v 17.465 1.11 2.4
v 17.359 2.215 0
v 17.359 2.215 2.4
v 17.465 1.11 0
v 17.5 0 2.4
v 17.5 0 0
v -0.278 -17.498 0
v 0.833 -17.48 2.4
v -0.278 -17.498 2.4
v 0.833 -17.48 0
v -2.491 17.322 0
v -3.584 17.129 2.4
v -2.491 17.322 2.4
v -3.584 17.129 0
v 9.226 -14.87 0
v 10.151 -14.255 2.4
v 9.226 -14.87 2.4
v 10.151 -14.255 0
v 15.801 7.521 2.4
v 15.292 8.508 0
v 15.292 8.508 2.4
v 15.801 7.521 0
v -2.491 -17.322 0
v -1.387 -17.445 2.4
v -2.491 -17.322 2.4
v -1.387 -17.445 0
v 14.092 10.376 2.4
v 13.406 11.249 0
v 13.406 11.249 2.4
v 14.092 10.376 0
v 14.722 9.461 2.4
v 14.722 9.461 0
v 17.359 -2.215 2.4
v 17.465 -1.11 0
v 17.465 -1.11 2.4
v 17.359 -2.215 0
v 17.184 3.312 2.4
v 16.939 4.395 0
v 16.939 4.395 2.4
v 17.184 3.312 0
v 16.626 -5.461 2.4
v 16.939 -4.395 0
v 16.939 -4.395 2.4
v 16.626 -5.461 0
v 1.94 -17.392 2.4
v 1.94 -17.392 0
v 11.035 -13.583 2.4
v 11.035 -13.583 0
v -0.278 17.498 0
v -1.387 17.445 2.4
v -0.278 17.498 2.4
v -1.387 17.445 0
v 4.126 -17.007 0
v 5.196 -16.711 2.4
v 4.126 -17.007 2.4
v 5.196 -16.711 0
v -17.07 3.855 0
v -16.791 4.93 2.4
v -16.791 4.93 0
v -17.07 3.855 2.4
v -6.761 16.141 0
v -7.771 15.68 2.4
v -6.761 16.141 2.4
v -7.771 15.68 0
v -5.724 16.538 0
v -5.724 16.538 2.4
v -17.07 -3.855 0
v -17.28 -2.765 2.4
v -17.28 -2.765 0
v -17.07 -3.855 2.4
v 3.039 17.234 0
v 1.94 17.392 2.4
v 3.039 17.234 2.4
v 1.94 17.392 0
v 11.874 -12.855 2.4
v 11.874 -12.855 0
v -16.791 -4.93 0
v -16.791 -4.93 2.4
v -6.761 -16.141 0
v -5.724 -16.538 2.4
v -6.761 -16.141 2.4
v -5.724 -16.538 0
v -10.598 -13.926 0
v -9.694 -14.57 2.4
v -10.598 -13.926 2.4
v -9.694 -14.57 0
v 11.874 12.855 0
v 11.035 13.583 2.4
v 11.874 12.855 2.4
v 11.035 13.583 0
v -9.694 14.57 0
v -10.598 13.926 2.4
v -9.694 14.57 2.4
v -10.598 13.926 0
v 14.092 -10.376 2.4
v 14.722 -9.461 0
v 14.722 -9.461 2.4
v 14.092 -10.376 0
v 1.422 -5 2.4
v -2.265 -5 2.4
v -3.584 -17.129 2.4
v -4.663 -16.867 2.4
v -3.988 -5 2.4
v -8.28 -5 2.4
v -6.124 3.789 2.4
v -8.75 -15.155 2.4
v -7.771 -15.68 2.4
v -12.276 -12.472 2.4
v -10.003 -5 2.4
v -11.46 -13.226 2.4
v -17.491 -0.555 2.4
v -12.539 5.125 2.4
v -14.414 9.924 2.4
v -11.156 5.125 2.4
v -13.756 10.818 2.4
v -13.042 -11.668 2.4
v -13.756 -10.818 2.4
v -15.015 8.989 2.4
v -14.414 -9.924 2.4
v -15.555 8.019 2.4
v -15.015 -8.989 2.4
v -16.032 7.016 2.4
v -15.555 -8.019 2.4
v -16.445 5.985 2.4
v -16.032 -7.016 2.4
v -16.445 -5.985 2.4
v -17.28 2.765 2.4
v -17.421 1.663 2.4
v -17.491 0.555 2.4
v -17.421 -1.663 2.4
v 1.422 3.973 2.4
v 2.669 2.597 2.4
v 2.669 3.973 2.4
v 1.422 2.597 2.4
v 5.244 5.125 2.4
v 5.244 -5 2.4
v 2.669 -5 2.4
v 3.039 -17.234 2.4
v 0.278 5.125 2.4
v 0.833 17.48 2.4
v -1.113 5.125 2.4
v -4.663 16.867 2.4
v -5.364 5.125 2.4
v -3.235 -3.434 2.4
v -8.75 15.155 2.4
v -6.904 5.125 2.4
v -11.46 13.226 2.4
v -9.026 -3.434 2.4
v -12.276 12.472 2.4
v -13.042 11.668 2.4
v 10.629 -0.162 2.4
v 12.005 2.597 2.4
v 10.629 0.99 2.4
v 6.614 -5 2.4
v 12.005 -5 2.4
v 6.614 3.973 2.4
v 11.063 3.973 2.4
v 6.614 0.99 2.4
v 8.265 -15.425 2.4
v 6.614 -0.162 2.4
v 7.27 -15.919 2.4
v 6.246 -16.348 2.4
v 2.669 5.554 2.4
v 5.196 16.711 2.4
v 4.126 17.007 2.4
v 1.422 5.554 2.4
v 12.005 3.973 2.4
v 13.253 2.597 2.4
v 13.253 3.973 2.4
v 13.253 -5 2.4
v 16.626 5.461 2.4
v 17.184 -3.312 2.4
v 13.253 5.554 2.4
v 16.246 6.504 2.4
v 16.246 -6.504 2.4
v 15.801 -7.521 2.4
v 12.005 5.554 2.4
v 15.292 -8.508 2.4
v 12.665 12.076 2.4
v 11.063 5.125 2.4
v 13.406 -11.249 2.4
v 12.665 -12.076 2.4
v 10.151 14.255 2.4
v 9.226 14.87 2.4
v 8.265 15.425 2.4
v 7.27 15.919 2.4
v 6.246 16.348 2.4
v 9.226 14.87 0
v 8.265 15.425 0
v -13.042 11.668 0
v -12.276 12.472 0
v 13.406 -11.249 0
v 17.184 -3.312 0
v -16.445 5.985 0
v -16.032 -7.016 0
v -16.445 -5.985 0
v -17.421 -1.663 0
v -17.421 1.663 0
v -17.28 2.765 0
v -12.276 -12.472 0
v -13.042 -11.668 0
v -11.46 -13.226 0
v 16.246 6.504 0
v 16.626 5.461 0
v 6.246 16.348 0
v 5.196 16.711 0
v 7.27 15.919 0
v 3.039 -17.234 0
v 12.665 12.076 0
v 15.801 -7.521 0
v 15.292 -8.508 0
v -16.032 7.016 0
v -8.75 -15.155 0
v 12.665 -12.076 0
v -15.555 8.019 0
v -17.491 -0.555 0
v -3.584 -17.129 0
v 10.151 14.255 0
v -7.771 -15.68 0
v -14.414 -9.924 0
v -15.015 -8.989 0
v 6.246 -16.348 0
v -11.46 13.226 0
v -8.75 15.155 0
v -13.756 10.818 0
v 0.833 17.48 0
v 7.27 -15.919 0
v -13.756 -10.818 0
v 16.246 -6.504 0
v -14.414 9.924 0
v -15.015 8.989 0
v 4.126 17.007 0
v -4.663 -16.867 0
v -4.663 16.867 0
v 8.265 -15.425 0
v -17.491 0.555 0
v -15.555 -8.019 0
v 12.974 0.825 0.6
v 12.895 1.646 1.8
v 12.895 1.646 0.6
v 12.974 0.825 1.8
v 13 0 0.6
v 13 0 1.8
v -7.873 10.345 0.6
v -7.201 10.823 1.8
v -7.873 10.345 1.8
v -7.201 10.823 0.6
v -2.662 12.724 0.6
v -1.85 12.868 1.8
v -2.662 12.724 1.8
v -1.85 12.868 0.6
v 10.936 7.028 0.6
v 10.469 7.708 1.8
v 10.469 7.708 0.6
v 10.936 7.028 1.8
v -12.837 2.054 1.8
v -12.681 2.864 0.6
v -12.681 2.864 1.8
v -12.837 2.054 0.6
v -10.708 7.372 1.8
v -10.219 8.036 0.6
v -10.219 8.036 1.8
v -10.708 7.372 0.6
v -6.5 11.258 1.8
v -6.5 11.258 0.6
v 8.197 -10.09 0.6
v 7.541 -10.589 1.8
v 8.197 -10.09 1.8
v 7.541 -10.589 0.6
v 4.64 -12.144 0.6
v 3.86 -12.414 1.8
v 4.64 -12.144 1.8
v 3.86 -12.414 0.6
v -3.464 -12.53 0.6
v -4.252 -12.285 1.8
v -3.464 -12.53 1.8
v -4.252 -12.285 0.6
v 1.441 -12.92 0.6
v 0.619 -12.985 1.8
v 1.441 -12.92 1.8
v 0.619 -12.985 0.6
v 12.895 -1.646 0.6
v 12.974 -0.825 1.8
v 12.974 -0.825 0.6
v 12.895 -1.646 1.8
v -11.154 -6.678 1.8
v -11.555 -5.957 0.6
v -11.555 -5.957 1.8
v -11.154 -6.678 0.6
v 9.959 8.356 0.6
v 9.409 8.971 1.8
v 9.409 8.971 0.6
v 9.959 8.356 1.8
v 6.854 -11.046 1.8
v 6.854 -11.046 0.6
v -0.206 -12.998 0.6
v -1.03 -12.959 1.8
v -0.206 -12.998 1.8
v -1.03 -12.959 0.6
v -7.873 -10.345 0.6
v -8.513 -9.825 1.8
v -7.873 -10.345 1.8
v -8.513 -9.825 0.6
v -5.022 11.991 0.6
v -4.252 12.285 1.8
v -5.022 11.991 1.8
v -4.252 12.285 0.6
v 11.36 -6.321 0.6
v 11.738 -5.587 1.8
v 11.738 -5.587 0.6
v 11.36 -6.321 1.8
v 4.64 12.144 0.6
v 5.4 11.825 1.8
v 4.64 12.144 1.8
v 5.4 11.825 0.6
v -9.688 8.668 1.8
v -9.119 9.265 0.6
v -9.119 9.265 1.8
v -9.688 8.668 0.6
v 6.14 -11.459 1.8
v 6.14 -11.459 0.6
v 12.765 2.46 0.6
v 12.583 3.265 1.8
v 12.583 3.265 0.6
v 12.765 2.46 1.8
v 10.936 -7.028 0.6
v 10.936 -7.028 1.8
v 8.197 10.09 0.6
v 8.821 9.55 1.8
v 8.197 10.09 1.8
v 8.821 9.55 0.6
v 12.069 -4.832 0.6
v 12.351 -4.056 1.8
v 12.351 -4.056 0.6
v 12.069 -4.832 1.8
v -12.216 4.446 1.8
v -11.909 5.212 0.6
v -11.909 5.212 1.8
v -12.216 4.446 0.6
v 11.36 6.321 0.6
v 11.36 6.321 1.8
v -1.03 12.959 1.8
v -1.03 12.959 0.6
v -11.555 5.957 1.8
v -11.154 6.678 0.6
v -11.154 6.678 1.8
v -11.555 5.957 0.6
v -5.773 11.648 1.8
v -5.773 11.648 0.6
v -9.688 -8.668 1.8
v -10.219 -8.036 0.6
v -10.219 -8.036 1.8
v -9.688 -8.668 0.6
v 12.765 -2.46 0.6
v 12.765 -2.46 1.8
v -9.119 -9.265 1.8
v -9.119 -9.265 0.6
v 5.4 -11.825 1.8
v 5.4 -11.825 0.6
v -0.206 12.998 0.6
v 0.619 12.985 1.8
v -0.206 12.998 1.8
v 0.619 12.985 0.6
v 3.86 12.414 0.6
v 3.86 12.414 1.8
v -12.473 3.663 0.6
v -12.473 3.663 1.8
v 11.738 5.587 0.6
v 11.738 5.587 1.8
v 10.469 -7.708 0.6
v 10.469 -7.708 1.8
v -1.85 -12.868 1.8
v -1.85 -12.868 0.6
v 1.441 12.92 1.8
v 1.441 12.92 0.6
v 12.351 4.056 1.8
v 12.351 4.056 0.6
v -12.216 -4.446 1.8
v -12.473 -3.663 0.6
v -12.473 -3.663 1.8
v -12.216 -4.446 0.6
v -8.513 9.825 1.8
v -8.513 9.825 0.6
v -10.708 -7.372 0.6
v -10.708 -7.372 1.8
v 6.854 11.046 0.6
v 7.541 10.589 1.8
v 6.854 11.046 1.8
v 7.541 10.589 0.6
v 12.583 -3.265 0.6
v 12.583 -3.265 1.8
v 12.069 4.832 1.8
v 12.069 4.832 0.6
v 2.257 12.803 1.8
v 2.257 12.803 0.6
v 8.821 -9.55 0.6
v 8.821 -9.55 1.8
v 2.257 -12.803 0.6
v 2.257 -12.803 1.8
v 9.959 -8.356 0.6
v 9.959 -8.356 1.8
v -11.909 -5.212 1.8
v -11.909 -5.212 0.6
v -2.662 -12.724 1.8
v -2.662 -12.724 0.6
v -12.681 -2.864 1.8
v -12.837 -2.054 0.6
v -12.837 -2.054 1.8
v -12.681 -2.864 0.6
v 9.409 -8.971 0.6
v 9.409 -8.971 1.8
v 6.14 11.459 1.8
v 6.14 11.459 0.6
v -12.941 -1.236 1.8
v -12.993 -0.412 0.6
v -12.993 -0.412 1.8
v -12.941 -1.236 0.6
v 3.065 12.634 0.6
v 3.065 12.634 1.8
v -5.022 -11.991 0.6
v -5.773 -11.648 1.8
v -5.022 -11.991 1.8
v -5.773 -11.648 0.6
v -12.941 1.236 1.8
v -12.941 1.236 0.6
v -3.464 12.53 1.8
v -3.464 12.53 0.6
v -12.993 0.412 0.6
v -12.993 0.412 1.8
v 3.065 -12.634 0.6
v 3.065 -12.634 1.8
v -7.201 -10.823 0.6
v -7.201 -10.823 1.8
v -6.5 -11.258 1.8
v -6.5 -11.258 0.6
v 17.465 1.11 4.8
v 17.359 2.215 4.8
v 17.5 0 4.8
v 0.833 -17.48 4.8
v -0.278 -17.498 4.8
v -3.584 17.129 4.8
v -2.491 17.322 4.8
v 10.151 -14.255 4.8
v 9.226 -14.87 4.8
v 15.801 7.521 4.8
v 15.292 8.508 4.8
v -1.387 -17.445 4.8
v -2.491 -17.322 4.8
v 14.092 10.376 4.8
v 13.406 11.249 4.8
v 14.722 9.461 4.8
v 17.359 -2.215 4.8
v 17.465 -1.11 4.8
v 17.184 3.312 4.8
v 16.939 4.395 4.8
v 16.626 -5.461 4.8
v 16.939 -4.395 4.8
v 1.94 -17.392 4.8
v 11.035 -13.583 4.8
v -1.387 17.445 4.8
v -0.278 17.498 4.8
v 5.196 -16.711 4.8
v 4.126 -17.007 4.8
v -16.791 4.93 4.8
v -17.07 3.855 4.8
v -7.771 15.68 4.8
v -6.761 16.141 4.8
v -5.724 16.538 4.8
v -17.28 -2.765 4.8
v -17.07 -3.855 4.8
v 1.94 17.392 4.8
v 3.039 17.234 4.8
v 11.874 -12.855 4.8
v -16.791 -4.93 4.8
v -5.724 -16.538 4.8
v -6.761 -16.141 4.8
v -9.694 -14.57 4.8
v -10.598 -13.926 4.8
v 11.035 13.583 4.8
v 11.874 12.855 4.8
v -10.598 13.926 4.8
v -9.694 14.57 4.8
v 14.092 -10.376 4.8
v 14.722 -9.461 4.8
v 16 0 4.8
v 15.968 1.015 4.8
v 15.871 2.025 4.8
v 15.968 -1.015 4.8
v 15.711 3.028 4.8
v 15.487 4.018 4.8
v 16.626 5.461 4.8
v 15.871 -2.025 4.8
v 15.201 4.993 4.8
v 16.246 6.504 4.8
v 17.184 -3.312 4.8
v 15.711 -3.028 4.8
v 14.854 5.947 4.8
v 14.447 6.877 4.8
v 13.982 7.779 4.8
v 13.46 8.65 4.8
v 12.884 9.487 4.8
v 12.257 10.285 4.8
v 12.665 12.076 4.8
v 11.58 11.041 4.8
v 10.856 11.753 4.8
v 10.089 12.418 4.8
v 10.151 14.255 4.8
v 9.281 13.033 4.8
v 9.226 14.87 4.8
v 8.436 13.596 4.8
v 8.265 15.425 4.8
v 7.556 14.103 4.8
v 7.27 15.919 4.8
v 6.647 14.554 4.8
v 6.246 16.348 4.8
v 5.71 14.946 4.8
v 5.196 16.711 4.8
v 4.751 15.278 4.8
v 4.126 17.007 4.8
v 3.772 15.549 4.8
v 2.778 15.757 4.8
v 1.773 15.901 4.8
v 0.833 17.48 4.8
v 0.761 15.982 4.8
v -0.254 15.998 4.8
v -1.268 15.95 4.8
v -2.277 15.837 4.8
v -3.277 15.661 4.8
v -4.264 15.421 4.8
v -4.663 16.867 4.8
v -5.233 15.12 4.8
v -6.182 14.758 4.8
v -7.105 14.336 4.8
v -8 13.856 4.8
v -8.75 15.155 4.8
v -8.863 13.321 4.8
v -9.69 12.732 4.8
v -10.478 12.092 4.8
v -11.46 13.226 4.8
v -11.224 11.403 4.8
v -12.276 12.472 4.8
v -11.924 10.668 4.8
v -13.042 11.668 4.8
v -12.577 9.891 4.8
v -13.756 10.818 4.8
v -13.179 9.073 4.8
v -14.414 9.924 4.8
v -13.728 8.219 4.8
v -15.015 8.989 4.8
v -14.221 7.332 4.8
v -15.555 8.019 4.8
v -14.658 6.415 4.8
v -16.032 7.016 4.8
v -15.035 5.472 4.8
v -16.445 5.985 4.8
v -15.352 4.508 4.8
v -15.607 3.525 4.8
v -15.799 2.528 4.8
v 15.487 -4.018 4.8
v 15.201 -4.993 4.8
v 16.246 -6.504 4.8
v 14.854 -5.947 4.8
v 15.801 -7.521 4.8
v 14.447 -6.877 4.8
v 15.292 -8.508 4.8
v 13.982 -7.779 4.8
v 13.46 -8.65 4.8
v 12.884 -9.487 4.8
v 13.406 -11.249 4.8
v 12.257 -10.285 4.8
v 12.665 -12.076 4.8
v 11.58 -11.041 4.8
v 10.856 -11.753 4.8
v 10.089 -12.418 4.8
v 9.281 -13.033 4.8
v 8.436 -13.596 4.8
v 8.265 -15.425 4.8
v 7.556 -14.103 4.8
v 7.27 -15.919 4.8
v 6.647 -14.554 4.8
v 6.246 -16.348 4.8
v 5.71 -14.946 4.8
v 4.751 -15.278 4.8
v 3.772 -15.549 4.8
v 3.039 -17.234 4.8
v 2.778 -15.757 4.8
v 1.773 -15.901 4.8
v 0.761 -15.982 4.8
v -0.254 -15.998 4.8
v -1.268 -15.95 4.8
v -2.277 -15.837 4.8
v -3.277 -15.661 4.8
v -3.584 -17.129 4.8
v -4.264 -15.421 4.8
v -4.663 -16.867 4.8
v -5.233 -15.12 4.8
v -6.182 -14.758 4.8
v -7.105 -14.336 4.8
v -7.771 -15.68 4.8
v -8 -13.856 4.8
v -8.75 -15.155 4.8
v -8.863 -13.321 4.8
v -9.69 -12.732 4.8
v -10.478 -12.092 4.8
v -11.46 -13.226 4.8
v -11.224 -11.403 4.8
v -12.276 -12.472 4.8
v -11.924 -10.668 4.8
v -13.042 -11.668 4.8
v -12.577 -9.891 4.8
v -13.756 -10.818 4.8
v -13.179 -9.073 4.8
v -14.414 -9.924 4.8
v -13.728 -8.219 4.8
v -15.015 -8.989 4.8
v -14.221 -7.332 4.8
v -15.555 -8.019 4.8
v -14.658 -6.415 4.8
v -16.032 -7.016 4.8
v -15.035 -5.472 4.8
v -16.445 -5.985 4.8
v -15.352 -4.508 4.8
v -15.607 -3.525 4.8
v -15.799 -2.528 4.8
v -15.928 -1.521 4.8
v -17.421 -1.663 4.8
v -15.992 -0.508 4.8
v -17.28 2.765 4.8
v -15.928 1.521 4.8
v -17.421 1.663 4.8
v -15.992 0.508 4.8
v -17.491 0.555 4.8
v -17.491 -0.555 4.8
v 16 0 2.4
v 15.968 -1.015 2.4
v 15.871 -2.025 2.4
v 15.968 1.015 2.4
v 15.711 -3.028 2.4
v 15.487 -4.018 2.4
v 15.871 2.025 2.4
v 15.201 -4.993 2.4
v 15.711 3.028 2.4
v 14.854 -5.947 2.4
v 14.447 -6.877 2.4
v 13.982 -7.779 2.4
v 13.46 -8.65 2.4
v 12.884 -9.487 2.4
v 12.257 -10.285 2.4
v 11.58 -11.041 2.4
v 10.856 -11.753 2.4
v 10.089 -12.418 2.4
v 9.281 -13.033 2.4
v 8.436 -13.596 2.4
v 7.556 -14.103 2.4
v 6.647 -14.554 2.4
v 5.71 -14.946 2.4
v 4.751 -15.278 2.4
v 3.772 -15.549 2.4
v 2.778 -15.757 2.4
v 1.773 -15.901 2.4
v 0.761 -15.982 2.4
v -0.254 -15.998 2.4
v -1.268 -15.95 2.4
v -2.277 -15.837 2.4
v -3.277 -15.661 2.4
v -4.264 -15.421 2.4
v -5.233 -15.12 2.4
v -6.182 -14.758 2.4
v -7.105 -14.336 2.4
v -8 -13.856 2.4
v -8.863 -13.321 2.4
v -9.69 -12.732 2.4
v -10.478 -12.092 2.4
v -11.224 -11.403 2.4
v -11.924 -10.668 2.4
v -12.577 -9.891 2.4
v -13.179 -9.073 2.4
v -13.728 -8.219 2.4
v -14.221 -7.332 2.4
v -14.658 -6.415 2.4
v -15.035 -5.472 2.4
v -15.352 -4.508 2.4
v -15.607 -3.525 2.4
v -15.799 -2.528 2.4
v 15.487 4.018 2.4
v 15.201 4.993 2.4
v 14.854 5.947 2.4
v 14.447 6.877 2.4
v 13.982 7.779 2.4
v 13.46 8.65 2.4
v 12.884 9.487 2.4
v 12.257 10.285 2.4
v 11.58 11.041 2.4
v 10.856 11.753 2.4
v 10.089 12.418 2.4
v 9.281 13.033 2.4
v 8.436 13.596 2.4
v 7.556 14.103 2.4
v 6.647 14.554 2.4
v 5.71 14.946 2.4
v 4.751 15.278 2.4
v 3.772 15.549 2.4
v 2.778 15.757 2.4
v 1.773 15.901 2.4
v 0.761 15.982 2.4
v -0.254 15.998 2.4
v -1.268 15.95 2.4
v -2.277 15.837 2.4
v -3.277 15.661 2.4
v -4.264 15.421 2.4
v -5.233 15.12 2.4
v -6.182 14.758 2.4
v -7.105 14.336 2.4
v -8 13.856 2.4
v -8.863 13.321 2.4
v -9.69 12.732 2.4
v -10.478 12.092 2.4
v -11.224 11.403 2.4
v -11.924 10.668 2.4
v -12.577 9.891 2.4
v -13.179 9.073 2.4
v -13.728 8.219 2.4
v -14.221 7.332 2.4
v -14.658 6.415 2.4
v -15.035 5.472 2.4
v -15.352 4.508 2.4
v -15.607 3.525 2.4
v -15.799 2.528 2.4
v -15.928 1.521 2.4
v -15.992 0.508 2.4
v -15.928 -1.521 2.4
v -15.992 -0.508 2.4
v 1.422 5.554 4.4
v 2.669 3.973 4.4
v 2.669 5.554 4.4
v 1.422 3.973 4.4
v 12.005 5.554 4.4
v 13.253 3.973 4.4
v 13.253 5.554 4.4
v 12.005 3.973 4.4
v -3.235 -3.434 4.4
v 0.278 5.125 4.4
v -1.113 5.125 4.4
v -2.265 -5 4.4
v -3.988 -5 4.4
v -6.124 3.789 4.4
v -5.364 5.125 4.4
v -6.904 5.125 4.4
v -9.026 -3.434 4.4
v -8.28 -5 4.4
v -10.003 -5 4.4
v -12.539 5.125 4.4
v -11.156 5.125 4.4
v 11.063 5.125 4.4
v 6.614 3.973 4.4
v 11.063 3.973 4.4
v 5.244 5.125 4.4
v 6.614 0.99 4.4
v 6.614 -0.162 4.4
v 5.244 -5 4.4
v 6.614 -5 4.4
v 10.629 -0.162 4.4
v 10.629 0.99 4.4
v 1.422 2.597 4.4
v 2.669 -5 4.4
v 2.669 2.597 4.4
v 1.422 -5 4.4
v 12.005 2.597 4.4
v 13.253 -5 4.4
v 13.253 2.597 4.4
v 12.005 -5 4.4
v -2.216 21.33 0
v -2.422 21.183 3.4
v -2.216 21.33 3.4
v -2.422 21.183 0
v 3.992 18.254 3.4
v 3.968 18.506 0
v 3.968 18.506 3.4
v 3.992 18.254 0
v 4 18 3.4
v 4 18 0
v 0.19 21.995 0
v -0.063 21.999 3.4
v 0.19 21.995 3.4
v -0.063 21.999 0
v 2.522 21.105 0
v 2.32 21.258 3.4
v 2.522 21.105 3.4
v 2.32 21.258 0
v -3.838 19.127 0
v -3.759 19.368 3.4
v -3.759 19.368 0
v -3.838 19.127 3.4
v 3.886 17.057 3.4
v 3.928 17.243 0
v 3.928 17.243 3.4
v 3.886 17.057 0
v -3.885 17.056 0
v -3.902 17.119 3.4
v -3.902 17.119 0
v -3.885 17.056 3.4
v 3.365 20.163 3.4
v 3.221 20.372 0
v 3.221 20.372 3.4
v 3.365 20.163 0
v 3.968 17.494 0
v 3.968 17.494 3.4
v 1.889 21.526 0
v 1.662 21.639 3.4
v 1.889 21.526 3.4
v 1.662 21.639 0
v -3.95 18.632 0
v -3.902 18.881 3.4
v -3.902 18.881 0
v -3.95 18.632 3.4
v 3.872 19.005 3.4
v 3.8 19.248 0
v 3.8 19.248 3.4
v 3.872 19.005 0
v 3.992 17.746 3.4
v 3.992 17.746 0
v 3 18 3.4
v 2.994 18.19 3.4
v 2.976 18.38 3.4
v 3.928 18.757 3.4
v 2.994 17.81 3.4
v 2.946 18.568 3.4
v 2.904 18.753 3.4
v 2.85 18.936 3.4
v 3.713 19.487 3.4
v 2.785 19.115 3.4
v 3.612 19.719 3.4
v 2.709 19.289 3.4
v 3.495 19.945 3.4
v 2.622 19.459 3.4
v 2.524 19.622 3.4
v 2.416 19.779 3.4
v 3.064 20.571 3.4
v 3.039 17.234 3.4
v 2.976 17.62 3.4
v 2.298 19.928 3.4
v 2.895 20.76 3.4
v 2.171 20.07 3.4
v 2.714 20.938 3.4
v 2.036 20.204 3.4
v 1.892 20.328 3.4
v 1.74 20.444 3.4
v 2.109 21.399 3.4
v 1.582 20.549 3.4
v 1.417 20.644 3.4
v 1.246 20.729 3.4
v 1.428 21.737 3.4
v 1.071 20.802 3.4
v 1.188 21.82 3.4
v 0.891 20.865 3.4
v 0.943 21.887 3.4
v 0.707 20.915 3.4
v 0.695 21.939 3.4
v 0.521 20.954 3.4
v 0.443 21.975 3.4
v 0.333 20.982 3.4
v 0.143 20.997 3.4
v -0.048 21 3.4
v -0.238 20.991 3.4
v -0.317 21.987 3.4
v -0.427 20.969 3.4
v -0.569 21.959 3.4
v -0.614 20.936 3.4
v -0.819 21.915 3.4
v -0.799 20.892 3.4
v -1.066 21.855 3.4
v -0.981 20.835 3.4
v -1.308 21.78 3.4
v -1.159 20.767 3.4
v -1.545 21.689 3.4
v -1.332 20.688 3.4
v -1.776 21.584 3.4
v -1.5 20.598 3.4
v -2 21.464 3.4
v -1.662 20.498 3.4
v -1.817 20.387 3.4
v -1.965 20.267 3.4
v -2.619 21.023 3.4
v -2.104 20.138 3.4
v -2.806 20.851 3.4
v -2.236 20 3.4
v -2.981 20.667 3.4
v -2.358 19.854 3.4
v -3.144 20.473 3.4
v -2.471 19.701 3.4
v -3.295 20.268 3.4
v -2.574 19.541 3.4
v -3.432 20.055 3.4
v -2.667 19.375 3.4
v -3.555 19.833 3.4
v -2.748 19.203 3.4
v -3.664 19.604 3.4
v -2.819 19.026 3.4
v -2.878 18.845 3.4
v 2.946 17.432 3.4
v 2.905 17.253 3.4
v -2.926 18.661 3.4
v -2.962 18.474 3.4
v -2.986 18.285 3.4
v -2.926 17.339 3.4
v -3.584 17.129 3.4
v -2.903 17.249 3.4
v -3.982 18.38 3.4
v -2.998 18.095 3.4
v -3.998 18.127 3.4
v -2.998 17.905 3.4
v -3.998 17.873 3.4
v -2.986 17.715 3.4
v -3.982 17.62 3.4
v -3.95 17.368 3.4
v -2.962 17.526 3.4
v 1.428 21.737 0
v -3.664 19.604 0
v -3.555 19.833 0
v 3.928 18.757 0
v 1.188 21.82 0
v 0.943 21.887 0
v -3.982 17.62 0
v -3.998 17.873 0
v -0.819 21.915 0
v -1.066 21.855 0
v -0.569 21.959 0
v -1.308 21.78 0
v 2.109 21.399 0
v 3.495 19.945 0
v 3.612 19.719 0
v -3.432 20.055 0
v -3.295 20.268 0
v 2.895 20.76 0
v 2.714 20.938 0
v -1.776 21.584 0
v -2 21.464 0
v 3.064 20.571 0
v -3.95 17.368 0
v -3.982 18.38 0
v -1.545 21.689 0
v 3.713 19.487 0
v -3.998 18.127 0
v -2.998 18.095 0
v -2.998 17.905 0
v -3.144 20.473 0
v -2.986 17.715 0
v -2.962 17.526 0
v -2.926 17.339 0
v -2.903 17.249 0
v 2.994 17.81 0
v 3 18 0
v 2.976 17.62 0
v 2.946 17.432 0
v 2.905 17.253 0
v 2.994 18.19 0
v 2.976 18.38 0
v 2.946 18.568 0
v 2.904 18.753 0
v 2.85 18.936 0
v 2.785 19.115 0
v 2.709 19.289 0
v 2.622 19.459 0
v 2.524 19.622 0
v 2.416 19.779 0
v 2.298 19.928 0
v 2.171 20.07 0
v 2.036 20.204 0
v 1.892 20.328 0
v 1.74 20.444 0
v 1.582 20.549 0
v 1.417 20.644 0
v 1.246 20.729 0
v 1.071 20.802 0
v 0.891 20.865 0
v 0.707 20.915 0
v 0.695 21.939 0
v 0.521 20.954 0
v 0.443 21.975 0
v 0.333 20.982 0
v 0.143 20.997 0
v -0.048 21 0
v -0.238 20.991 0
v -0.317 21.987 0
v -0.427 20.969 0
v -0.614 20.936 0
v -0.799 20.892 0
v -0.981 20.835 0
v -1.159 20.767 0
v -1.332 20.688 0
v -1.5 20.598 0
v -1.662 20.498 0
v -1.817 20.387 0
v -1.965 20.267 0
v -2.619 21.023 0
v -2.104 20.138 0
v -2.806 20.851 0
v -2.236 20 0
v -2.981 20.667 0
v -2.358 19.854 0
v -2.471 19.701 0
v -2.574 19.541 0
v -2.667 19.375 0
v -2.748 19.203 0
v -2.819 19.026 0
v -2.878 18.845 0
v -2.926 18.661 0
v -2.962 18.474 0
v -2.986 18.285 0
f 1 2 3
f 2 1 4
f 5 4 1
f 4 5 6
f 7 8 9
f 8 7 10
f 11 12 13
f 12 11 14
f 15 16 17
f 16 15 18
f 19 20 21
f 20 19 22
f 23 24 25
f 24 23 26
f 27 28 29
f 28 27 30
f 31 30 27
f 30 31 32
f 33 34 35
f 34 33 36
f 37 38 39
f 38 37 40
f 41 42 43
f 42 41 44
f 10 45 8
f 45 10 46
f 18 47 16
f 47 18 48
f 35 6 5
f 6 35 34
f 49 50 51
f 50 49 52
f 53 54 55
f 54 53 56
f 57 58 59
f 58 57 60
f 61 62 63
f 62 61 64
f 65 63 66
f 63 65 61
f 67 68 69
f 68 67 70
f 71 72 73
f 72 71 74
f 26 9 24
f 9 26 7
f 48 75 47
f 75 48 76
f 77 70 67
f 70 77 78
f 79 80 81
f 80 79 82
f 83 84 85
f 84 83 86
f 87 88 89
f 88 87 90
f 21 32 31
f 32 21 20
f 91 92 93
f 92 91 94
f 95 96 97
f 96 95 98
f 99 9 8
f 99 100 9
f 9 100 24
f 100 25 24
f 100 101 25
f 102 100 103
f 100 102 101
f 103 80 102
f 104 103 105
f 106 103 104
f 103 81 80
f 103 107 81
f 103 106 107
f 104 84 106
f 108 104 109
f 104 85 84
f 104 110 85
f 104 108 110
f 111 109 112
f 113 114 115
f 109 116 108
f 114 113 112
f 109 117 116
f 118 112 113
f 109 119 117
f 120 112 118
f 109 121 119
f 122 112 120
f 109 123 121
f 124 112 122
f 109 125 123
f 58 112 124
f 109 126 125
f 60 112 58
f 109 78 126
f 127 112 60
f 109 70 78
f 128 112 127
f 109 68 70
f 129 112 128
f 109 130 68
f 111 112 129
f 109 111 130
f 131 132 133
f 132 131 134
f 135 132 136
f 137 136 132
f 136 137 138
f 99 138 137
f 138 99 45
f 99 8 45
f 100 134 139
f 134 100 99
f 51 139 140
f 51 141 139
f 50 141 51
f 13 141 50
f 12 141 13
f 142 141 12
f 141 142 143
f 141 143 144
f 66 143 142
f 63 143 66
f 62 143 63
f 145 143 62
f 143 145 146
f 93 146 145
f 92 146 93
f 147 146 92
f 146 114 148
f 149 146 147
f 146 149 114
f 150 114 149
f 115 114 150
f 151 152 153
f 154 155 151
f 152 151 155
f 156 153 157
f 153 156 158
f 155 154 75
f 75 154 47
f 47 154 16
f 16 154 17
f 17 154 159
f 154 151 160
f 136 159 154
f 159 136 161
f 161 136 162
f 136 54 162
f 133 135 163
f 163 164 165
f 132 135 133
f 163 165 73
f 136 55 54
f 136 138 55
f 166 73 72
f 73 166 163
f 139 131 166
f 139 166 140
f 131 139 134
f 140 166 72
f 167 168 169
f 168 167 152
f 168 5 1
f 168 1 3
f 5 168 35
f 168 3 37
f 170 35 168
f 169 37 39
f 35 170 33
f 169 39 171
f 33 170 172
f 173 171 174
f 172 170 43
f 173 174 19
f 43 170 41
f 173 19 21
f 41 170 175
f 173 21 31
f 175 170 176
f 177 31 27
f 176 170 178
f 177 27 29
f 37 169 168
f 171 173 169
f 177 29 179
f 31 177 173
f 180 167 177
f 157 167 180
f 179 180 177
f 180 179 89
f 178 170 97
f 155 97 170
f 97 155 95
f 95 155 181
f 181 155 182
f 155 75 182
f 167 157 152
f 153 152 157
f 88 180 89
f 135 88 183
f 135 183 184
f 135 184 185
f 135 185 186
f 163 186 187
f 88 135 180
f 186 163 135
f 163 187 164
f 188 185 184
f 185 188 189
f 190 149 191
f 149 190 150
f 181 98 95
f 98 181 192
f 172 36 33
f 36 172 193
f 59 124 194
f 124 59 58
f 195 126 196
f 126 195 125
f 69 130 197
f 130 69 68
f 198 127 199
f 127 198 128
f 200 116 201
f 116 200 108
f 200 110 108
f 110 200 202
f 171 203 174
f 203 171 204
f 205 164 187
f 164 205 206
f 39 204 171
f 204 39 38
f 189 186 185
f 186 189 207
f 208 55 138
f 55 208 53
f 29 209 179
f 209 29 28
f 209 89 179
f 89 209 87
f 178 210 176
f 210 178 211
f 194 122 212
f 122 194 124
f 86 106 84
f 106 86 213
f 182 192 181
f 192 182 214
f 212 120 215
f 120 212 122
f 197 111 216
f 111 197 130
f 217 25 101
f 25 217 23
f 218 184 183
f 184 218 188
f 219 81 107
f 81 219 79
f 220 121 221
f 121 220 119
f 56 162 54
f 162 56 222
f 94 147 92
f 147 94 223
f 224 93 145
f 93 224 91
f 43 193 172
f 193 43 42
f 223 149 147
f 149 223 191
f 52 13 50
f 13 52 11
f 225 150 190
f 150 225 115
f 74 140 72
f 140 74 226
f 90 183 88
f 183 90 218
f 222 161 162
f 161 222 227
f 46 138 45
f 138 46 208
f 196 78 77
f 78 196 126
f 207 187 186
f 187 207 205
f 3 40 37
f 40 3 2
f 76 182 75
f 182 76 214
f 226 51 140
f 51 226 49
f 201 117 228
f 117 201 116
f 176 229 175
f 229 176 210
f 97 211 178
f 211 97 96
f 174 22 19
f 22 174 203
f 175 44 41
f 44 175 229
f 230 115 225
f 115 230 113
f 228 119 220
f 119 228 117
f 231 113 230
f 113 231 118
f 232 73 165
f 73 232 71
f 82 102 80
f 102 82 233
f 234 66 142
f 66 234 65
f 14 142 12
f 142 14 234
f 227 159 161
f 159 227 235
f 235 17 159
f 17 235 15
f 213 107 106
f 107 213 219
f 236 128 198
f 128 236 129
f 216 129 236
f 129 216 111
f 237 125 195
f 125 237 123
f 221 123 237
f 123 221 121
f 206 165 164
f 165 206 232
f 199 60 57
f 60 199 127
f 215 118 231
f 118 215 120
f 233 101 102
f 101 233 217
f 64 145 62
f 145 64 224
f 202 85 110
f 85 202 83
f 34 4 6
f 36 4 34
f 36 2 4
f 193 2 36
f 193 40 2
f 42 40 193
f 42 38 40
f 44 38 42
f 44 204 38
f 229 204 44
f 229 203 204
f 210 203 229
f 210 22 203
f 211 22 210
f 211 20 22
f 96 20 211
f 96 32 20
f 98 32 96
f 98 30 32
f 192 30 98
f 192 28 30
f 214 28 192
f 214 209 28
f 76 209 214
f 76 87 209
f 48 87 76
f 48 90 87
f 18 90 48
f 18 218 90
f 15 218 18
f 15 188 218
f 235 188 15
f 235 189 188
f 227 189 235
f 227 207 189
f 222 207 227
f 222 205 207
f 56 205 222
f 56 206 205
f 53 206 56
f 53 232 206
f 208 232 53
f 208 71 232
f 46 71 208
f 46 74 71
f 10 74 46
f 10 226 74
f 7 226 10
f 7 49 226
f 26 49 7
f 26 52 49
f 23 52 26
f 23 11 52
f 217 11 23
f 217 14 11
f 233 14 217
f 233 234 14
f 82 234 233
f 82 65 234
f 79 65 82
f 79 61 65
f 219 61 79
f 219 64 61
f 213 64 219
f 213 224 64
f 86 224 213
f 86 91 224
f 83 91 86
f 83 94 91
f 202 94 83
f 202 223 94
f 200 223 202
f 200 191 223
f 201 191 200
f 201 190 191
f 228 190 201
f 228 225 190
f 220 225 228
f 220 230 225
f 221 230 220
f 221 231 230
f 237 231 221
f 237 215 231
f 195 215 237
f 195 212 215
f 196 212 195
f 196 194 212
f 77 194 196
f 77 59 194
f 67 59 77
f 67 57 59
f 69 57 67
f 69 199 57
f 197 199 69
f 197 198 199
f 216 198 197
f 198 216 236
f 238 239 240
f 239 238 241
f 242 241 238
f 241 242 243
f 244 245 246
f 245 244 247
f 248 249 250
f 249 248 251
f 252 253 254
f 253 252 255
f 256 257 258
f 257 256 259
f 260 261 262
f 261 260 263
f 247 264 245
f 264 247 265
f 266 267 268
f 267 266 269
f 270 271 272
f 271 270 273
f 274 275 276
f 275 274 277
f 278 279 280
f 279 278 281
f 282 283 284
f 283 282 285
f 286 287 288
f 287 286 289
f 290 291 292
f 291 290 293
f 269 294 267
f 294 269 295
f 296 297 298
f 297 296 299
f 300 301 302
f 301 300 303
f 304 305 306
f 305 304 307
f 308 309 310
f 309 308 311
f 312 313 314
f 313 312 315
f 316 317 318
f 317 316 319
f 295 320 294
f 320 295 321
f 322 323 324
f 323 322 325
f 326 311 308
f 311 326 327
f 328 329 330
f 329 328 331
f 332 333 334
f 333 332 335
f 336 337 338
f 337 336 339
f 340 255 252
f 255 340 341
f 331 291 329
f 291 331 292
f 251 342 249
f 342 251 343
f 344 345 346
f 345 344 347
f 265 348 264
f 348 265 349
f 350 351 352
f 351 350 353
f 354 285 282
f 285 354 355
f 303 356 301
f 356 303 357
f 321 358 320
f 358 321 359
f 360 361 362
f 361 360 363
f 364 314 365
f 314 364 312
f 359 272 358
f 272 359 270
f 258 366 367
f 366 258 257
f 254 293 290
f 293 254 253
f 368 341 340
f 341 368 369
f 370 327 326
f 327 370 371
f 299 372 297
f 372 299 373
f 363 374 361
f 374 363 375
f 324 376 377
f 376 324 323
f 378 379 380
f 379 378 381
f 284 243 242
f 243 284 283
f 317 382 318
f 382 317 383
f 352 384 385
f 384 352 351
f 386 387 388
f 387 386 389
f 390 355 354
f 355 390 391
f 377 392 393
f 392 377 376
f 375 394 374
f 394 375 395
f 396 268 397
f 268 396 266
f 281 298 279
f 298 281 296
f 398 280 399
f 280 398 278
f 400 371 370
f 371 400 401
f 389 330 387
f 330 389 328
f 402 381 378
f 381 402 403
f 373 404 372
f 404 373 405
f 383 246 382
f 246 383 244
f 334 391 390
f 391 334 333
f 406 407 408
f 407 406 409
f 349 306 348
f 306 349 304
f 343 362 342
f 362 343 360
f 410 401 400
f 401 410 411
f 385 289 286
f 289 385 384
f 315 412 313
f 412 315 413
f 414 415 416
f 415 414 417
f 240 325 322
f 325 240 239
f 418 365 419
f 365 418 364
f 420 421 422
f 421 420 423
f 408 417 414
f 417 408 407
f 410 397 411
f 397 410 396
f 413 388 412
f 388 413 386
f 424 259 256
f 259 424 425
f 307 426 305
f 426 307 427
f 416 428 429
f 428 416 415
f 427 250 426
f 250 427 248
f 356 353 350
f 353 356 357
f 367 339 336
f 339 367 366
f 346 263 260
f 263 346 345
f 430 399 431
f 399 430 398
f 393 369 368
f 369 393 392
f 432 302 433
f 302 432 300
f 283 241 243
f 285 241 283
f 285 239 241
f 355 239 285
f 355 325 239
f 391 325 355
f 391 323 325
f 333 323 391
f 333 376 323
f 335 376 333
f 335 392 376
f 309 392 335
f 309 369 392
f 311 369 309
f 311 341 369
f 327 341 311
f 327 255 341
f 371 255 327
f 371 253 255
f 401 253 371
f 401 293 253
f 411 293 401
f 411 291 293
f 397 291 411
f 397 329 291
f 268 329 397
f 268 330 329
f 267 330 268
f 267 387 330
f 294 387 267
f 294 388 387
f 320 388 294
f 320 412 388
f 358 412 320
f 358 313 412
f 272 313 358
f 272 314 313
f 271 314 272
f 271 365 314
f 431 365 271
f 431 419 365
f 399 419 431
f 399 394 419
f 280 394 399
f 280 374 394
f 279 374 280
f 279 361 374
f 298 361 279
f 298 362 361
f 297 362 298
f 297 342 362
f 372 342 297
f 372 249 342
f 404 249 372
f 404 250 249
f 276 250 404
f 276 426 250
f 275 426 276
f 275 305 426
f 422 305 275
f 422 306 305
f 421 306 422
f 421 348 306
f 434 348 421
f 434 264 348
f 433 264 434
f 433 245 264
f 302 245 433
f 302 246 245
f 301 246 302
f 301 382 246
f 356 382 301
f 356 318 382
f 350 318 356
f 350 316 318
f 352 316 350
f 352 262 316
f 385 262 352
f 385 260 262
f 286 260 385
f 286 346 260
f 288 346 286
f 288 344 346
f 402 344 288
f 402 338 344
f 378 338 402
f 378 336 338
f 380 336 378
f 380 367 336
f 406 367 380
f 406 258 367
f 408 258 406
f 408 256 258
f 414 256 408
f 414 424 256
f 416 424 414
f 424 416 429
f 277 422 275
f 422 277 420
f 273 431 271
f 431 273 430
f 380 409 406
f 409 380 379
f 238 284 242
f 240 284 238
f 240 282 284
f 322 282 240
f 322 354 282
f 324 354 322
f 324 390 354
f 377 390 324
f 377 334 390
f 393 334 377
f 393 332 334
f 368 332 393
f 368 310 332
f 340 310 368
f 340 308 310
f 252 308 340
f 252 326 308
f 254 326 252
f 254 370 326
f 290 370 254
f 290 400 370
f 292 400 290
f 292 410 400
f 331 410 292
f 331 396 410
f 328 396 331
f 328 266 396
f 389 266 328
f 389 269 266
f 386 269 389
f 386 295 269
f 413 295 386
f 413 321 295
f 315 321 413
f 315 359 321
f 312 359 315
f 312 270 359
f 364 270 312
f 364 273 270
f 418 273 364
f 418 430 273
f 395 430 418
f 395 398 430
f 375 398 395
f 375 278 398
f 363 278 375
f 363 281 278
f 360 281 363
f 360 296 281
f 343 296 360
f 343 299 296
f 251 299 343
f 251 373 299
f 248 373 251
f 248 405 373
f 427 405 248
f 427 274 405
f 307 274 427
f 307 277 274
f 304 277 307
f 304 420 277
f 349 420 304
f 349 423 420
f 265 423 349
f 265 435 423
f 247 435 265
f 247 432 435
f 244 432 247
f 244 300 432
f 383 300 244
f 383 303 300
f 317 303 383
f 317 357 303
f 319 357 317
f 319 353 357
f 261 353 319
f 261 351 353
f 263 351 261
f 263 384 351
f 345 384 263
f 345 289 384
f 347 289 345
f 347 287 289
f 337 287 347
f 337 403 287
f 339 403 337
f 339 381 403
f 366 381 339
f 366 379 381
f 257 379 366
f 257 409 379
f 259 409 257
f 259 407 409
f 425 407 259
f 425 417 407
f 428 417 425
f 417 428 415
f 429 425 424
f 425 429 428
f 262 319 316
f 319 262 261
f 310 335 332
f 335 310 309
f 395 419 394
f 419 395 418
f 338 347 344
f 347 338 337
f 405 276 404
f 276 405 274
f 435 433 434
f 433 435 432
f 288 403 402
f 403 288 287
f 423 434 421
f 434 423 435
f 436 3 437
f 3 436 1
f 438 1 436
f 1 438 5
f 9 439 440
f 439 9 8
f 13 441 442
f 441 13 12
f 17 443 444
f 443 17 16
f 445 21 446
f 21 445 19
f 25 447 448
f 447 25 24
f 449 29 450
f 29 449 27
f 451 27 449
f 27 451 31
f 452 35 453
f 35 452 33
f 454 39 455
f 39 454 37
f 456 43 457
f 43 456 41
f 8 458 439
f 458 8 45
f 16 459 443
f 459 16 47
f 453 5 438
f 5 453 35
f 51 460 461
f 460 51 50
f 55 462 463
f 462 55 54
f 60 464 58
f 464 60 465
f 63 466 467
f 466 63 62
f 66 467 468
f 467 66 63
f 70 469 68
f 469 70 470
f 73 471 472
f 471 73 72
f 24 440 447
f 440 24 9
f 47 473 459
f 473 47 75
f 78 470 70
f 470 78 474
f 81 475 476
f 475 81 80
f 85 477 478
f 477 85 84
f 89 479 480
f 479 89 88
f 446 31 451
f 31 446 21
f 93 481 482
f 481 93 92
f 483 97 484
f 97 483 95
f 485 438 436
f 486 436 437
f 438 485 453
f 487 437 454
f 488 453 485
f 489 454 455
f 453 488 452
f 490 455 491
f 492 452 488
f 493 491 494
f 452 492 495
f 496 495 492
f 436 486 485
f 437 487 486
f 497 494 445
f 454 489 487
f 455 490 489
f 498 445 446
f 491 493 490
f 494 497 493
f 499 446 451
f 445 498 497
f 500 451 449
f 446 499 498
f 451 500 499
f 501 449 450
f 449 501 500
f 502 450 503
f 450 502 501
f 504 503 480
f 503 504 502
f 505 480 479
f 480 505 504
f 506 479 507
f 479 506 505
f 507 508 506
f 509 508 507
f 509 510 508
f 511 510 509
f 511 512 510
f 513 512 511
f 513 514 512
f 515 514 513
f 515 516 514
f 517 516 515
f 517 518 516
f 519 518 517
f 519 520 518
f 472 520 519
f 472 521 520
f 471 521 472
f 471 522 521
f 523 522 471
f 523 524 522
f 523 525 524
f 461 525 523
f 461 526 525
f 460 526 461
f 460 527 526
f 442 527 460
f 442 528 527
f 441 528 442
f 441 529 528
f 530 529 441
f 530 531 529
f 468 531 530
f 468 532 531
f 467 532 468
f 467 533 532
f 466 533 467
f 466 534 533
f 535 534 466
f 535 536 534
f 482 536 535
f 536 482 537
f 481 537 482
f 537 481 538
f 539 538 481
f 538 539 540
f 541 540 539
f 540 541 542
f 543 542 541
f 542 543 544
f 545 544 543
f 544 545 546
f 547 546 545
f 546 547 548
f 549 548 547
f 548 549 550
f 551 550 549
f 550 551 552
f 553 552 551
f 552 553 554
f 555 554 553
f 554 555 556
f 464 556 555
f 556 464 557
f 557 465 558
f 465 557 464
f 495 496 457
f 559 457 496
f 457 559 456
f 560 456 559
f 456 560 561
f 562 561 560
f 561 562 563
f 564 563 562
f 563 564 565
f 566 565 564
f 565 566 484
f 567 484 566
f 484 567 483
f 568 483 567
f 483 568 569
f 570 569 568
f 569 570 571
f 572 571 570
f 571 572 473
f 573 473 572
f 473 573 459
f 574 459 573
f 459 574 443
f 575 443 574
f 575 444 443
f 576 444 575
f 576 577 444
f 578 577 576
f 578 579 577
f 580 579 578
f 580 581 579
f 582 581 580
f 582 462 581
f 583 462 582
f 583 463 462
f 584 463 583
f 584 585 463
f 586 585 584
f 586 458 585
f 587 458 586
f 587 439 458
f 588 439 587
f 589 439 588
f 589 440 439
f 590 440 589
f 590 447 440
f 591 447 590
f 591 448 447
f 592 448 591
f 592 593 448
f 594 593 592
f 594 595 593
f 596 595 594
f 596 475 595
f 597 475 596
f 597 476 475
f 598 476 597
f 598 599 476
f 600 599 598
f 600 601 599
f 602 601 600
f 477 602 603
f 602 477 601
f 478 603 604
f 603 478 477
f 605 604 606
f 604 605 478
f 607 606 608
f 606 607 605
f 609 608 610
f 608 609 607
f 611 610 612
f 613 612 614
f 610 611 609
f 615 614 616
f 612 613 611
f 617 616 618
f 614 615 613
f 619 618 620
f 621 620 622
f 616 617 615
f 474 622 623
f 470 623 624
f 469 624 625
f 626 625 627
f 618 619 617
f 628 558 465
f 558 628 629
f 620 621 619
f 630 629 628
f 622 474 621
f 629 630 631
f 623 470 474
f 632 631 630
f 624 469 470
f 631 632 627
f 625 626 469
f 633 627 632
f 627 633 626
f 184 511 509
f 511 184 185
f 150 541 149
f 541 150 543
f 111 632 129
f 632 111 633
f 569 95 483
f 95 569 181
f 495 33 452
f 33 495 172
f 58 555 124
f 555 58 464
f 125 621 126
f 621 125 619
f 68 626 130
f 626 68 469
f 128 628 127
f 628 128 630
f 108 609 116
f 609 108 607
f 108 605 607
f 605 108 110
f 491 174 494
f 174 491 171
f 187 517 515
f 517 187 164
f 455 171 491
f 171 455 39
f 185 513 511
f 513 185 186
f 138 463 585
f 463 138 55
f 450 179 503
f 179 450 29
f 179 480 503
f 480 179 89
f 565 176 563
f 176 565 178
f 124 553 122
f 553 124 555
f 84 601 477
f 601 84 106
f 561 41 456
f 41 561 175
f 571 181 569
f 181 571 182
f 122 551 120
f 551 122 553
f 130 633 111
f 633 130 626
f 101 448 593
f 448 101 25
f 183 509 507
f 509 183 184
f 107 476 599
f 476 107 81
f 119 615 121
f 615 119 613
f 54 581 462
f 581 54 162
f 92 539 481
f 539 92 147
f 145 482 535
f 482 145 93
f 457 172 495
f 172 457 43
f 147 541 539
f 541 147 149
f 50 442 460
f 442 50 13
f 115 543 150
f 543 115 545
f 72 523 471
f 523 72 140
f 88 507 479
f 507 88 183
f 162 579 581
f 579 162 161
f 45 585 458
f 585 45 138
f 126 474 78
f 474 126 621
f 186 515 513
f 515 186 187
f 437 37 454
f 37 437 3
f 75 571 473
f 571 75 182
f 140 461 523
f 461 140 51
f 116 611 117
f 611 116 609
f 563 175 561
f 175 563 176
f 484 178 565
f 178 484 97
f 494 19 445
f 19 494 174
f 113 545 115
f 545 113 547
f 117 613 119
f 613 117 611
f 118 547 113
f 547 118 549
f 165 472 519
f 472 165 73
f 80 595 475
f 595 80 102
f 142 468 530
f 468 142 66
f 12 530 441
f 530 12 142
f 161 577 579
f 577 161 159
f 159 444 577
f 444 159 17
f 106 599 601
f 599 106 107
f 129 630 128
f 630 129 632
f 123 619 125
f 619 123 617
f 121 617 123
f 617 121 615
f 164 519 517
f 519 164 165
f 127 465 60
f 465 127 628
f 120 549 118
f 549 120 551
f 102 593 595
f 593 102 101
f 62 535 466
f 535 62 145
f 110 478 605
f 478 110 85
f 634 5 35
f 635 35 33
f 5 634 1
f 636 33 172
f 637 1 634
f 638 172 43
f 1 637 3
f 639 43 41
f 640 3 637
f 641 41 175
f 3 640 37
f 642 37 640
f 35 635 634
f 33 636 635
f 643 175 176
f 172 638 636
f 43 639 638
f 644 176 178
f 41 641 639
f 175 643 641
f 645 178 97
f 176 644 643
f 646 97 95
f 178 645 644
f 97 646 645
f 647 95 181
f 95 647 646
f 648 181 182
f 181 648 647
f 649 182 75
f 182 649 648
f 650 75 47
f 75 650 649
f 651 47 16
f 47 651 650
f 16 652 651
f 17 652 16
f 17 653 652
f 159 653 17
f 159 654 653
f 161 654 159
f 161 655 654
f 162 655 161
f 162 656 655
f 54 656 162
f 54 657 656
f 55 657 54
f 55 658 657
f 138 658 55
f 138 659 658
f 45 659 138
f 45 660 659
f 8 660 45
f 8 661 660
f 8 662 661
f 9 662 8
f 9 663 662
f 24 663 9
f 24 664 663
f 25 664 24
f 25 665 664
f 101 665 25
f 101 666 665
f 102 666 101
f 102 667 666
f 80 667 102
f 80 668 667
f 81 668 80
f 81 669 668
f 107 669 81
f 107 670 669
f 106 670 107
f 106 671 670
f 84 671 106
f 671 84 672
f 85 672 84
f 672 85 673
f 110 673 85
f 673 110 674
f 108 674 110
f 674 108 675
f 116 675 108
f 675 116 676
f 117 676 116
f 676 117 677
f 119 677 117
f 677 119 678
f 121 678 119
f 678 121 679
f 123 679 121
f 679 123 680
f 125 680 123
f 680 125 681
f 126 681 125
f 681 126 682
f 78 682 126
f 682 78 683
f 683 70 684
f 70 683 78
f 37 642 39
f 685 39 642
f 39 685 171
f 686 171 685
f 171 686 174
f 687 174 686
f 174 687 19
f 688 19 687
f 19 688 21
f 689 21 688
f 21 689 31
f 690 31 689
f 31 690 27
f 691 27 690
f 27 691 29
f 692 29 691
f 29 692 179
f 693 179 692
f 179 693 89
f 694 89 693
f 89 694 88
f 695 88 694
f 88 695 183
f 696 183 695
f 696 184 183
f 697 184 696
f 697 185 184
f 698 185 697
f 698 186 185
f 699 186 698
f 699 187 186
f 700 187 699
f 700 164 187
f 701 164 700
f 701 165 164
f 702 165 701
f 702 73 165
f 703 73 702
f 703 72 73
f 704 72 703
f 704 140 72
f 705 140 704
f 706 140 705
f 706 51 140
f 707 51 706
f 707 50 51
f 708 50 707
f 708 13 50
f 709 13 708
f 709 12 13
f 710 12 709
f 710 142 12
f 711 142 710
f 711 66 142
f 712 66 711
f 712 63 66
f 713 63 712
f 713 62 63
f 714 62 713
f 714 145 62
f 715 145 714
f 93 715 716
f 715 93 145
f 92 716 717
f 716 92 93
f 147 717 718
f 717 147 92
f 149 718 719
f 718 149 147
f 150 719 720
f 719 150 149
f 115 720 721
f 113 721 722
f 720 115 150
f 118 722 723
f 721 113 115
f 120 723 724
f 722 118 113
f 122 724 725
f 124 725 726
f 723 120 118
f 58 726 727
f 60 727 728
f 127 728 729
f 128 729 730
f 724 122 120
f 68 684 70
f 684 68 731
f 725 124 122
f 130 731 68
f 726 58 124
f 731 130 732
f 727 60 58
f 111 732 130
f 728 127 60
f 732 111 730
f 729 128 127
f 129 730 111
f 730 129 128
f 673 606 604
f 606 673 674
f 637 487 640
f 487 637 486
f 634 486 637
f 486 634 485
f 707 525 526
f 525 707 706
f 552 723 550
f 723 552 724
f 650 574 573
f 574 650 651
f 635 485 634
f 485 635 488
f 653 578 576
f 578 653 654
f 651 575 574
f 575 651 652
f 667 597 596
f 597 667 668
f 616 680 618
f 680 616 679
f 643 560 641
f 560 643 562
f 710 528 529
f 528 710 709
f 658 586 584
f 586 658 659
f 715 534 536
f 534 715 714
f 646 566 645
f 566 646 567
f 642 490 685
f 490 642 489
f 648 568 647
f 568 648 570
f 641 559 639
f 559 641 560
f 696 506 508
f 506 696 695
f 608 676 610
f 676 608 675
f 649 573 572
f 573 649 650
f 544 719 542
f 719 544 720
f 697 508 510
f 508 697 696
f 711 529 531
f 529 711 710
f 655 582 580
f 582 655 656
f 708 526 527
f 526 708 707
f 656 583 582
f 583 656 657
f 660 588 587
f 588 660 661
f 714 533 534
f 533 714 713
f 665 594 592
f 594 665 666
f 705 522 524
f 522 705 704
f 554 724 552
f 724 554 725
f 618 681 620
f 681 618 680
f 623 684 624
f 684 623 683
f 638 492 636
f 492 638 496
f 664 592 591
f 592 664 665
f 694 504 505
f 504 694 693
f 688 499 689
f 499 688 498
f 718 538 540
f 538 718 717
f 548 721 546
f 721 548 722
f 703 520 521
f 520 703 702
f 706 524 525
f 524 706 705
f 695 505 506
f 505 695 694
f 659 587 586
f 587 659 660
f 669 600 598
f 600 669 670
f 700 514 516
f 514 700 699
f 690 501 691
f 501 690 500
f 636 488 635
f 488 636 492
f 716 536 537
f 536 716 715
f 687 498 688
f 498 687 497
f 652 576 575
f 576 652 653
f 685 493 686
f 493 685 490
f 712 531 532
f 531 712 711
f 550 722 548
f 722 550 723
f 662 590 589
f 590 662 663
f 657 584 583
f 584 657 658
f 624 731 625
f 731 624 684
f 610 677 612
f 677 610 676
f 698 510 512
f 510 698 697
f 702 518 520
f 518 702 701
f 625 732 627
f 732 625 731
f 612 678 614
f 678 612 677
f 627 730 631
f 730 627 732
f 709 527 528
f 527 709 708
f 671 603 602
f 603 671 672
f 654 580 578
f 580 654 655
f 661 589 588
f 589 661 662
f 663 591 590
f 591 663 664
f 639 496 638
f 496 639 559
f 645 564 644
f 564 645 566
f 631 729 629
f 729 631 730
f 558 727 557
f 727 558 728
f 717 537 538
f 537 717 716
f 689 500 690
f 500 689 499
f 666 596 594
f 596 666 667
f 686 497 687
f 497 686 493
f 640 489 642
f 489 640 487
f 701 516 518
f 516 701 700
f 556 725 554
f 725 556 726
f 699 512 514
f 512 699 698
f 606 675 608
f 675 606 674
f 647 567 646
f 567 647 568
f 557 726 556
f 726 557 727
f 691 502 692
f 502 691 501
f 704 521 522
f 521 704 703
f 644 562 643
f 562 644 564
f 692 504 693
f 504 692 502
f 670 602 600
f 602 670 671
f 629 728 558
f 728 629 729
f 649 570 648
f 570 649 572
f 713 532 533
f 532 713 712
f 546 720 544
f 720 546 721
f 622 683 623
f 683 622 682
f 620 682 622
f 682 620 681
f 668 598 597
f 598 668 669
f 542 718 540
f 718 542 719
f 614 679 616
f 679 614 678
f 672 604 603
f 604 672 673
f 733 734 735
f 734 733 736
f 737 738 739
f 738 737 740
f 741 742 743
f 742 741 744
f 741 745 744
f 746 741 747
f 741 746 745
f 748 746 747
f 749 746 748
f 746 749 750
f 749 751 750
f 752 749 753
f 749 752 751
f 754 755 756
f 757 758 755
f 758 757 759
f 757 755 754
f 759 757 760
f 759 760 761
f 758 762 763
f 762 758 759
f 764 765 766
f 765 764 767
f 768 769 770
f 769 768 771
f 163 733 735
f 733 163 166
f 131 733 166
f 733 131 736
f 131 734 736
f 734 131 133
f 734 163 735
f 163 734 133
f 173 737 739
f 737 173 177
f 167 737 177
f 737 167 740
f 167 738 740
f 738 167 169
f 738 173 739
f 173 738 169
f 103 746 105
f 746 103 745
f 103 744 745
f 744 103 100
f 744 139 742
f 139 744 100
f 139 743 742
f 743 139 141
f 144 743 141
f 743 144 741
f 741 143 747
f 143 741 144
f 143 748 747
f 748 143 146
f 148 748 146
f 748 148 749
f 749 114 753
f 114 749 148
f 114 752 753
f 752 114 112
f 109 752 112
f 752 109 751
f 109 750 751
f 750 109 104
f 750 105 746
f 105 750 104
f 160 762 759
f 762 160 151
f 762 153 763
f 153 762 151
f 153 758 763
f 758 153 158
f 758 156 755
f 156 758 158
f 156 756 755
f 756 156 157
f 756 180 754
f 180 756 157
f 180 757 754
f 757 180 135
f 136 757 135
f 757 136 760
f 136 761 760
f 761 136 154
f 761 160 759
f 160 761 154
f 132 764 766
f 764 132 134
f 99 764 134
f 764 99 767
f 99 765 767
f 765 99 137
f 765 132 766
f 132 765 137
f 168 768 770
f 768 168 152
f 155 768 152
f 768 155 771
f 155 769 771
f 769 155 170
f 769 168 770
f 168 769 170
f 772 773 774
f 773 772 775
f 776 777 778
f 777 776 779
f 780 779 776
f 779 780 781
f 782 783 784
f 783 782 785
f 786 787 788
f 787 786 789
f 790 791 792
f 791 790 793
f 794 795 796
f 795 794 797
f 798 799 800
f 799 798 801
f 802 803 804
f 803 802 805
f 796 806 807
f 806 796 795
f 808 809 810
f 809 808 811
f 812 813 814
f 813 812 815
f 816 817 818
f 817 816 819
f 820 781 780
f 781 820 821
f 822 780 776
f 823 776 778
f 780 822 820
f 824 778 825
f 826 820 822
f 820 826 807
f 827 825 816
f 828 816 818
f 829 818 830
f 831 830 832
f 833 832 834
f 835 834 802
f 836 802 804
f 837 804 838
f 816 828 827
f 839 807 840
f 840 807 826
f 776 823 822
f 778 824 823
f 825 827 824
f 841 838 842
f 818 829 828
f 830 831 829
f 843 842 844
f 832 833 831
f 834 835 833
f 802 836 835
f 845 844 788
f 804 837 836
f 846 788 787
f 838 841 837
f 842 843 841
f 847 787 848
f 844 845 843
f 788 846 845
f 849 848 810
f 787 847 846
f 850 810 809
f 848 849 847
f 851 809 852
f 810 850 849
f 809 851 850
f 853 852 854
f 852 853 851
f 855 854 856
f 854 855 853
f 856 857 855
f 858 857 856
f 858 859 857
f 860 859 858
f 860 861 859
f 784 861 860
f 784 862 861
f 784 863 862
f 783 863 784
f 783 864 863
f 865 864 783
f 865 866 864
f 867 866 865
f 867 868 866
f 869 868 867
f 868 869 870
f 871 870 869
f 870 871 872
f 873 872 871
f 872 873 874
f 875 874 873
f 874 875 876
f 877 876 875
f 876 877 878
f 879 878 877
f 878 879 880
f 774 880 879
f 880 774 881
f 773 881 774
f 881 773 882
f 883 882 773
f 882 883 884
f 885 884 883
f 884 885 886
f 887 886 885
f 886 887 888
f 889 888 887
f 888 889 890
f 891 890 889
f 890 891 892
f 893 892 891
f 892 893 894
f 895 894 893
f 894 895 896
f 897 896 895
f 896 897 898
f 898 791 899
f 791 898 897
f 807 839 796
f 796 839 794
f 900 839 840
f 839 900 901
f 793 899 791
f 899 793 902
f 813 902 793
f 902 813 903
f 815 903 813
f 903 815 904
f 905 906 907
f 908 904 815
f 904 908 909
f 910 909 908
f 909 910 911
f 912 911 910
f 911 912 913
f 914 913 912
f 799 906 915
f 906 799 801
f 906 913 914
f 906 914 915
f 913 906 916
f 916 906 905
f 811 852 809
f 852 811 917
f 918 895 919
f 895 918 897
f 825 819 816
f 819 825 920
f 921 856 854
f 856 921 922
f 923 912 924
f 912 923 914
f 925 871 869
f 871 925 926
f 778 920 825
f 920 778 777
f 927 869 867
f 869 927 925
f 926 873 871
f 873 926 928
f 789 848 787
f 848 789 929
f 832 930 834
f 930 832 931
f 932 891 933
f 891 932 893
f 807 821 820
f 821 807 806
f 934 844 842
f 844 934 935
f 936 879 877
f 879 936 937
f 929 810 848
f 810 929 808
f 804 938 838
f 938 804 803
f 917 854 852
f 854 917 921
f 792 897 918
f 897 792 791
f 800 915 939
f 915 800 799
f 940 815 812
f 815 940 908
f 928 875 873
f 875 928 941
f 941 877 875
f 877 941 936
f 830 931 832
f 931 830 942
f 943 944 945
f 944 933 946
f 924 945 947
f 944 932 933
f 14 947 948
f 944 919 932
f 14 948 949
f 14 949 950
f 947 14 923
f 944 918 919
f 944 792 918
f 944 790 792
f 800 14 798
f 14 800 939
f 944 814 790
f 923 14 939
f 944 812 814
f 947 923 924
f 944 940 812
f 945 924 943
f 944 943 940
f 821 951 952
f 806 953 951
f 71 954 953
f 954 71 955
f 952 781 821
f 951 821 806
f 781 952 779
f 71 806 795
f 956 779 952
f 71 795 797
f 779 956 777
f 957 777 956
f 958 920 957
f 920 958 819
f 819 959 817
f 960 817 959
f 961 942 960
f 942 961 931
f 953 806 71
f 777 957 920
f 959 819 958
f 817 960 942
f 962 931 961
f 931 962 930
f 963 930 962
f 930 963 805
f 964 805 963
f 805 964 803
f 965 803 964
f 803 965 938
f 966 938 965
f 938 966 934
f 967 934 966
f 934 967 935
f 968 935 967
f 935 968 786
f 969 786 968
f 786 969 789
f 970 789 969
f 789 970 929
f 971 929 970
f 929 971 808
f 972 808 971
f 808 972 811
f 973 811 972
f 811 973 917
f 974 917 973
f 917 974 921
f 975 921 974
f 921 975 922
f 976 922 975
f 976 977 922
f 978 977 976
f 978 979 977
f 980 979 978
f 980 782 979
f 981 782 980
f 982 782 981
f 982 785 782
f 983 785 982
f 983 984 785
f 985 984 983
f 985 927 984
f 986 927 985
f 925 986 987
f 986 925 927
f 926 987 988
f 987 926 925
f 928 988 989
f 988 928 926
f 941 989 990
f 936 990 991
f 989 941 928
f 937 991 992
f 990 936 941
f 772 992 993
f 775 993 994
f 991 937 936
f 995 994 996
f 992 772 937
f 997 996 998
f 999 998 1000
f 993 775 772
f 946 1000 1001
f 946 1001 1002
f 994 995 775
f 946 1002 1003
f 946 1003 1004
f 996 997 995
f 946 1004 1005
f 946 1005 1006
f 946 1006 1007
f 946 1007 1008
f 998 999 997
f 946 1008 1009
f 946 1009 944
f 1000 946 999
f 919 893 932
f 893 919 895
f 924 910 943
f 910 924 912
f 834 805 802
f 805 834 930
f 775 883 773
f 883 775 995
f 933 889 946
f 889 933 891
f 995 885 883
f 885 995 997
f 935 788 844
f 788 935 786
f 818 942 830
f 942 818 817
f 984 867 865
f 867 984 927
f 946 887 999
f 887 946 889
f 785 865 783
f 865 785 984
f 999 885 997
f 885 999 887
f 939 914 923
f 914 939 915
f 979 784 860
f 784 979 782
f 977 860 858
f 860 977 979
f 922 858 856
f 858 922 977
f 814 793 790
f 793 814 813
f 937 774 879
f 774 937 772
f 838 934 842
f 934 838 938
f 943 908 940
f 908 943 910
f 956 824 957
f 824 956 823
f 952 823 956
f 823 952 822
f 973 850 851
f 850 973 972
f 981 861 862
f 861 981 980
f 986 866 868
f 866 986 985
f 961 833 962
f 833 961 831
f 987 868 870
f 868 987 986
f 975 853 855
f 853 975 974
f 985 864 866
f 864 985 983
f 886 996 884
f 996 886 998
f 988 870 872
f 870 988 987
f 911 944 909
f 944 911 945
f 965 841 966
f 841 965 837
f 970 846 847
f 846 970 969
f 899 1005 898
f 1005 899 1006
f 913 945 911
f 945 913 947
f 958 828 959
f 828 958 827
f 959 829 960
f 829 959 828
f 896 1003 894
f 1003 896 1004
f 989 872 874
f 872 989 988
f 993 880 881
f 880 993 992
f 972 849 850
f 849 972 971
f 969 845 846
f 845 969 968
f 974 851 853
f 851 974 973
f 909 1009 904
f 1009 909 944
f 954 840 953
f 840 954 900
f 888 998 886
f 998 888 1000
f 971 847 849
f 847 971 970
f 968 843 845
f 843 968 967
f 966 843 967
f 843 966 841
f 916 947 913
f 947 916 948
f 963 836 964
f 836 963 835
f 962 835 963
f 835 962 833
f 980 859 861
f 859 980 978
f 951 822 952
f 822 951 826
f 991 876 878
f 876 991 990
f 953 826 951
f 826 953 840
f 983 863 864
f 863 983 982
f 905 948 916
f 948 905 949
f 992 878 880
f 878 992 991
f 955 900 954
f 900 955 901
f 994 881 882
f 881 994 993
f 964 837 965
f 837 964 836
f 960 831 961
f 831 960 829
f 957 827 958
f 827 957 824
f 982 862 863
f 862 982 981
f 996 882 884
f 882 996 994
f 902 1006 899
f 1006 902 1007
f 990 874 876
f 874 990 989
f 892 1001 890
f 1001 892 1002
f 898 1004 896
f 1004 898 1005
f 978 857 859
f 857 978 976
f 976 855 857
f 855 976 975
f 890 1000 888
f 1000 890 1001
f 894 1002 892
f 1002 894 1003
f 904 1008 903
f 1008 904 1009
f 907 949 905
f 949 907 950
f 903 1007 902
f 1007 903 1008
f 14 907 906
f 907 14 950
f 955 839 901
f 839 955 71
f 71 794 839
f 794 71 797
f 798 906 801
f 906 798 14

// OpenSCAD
namefont = "PT Sans:style=Regular";
main_letter_height=2;
size = 10;
t="WiFi";
$fn=99;
base_height = 2.4;
RFID_thick = 1.2;
union(){
    difference(){
       cylinder(d=35,h=base_height);
       translate([0,0,.6])cylinder(d=26,h=RFID_thick);
    }
    color("blue"){
    translate([-13,-5,base_height])linear_extrude(main_letter_height) 
        text(t,size,font=namefont);
    translate([0,0,base_height])difference(){
      cylinder(h=base_height, d=35);
      translate([0,0,-1])cylinder(h=base_height+2,d=32);
    }
    }

    translate([0,18,0])difference(){
        cylinder(h=base_height+1,d=8);
        translate([0,0,-1])cylinder(h=base_height+3,d=6);
        translate([0,-18,-1])cylinder(d=35,h=base_height+3);
        }
    }
